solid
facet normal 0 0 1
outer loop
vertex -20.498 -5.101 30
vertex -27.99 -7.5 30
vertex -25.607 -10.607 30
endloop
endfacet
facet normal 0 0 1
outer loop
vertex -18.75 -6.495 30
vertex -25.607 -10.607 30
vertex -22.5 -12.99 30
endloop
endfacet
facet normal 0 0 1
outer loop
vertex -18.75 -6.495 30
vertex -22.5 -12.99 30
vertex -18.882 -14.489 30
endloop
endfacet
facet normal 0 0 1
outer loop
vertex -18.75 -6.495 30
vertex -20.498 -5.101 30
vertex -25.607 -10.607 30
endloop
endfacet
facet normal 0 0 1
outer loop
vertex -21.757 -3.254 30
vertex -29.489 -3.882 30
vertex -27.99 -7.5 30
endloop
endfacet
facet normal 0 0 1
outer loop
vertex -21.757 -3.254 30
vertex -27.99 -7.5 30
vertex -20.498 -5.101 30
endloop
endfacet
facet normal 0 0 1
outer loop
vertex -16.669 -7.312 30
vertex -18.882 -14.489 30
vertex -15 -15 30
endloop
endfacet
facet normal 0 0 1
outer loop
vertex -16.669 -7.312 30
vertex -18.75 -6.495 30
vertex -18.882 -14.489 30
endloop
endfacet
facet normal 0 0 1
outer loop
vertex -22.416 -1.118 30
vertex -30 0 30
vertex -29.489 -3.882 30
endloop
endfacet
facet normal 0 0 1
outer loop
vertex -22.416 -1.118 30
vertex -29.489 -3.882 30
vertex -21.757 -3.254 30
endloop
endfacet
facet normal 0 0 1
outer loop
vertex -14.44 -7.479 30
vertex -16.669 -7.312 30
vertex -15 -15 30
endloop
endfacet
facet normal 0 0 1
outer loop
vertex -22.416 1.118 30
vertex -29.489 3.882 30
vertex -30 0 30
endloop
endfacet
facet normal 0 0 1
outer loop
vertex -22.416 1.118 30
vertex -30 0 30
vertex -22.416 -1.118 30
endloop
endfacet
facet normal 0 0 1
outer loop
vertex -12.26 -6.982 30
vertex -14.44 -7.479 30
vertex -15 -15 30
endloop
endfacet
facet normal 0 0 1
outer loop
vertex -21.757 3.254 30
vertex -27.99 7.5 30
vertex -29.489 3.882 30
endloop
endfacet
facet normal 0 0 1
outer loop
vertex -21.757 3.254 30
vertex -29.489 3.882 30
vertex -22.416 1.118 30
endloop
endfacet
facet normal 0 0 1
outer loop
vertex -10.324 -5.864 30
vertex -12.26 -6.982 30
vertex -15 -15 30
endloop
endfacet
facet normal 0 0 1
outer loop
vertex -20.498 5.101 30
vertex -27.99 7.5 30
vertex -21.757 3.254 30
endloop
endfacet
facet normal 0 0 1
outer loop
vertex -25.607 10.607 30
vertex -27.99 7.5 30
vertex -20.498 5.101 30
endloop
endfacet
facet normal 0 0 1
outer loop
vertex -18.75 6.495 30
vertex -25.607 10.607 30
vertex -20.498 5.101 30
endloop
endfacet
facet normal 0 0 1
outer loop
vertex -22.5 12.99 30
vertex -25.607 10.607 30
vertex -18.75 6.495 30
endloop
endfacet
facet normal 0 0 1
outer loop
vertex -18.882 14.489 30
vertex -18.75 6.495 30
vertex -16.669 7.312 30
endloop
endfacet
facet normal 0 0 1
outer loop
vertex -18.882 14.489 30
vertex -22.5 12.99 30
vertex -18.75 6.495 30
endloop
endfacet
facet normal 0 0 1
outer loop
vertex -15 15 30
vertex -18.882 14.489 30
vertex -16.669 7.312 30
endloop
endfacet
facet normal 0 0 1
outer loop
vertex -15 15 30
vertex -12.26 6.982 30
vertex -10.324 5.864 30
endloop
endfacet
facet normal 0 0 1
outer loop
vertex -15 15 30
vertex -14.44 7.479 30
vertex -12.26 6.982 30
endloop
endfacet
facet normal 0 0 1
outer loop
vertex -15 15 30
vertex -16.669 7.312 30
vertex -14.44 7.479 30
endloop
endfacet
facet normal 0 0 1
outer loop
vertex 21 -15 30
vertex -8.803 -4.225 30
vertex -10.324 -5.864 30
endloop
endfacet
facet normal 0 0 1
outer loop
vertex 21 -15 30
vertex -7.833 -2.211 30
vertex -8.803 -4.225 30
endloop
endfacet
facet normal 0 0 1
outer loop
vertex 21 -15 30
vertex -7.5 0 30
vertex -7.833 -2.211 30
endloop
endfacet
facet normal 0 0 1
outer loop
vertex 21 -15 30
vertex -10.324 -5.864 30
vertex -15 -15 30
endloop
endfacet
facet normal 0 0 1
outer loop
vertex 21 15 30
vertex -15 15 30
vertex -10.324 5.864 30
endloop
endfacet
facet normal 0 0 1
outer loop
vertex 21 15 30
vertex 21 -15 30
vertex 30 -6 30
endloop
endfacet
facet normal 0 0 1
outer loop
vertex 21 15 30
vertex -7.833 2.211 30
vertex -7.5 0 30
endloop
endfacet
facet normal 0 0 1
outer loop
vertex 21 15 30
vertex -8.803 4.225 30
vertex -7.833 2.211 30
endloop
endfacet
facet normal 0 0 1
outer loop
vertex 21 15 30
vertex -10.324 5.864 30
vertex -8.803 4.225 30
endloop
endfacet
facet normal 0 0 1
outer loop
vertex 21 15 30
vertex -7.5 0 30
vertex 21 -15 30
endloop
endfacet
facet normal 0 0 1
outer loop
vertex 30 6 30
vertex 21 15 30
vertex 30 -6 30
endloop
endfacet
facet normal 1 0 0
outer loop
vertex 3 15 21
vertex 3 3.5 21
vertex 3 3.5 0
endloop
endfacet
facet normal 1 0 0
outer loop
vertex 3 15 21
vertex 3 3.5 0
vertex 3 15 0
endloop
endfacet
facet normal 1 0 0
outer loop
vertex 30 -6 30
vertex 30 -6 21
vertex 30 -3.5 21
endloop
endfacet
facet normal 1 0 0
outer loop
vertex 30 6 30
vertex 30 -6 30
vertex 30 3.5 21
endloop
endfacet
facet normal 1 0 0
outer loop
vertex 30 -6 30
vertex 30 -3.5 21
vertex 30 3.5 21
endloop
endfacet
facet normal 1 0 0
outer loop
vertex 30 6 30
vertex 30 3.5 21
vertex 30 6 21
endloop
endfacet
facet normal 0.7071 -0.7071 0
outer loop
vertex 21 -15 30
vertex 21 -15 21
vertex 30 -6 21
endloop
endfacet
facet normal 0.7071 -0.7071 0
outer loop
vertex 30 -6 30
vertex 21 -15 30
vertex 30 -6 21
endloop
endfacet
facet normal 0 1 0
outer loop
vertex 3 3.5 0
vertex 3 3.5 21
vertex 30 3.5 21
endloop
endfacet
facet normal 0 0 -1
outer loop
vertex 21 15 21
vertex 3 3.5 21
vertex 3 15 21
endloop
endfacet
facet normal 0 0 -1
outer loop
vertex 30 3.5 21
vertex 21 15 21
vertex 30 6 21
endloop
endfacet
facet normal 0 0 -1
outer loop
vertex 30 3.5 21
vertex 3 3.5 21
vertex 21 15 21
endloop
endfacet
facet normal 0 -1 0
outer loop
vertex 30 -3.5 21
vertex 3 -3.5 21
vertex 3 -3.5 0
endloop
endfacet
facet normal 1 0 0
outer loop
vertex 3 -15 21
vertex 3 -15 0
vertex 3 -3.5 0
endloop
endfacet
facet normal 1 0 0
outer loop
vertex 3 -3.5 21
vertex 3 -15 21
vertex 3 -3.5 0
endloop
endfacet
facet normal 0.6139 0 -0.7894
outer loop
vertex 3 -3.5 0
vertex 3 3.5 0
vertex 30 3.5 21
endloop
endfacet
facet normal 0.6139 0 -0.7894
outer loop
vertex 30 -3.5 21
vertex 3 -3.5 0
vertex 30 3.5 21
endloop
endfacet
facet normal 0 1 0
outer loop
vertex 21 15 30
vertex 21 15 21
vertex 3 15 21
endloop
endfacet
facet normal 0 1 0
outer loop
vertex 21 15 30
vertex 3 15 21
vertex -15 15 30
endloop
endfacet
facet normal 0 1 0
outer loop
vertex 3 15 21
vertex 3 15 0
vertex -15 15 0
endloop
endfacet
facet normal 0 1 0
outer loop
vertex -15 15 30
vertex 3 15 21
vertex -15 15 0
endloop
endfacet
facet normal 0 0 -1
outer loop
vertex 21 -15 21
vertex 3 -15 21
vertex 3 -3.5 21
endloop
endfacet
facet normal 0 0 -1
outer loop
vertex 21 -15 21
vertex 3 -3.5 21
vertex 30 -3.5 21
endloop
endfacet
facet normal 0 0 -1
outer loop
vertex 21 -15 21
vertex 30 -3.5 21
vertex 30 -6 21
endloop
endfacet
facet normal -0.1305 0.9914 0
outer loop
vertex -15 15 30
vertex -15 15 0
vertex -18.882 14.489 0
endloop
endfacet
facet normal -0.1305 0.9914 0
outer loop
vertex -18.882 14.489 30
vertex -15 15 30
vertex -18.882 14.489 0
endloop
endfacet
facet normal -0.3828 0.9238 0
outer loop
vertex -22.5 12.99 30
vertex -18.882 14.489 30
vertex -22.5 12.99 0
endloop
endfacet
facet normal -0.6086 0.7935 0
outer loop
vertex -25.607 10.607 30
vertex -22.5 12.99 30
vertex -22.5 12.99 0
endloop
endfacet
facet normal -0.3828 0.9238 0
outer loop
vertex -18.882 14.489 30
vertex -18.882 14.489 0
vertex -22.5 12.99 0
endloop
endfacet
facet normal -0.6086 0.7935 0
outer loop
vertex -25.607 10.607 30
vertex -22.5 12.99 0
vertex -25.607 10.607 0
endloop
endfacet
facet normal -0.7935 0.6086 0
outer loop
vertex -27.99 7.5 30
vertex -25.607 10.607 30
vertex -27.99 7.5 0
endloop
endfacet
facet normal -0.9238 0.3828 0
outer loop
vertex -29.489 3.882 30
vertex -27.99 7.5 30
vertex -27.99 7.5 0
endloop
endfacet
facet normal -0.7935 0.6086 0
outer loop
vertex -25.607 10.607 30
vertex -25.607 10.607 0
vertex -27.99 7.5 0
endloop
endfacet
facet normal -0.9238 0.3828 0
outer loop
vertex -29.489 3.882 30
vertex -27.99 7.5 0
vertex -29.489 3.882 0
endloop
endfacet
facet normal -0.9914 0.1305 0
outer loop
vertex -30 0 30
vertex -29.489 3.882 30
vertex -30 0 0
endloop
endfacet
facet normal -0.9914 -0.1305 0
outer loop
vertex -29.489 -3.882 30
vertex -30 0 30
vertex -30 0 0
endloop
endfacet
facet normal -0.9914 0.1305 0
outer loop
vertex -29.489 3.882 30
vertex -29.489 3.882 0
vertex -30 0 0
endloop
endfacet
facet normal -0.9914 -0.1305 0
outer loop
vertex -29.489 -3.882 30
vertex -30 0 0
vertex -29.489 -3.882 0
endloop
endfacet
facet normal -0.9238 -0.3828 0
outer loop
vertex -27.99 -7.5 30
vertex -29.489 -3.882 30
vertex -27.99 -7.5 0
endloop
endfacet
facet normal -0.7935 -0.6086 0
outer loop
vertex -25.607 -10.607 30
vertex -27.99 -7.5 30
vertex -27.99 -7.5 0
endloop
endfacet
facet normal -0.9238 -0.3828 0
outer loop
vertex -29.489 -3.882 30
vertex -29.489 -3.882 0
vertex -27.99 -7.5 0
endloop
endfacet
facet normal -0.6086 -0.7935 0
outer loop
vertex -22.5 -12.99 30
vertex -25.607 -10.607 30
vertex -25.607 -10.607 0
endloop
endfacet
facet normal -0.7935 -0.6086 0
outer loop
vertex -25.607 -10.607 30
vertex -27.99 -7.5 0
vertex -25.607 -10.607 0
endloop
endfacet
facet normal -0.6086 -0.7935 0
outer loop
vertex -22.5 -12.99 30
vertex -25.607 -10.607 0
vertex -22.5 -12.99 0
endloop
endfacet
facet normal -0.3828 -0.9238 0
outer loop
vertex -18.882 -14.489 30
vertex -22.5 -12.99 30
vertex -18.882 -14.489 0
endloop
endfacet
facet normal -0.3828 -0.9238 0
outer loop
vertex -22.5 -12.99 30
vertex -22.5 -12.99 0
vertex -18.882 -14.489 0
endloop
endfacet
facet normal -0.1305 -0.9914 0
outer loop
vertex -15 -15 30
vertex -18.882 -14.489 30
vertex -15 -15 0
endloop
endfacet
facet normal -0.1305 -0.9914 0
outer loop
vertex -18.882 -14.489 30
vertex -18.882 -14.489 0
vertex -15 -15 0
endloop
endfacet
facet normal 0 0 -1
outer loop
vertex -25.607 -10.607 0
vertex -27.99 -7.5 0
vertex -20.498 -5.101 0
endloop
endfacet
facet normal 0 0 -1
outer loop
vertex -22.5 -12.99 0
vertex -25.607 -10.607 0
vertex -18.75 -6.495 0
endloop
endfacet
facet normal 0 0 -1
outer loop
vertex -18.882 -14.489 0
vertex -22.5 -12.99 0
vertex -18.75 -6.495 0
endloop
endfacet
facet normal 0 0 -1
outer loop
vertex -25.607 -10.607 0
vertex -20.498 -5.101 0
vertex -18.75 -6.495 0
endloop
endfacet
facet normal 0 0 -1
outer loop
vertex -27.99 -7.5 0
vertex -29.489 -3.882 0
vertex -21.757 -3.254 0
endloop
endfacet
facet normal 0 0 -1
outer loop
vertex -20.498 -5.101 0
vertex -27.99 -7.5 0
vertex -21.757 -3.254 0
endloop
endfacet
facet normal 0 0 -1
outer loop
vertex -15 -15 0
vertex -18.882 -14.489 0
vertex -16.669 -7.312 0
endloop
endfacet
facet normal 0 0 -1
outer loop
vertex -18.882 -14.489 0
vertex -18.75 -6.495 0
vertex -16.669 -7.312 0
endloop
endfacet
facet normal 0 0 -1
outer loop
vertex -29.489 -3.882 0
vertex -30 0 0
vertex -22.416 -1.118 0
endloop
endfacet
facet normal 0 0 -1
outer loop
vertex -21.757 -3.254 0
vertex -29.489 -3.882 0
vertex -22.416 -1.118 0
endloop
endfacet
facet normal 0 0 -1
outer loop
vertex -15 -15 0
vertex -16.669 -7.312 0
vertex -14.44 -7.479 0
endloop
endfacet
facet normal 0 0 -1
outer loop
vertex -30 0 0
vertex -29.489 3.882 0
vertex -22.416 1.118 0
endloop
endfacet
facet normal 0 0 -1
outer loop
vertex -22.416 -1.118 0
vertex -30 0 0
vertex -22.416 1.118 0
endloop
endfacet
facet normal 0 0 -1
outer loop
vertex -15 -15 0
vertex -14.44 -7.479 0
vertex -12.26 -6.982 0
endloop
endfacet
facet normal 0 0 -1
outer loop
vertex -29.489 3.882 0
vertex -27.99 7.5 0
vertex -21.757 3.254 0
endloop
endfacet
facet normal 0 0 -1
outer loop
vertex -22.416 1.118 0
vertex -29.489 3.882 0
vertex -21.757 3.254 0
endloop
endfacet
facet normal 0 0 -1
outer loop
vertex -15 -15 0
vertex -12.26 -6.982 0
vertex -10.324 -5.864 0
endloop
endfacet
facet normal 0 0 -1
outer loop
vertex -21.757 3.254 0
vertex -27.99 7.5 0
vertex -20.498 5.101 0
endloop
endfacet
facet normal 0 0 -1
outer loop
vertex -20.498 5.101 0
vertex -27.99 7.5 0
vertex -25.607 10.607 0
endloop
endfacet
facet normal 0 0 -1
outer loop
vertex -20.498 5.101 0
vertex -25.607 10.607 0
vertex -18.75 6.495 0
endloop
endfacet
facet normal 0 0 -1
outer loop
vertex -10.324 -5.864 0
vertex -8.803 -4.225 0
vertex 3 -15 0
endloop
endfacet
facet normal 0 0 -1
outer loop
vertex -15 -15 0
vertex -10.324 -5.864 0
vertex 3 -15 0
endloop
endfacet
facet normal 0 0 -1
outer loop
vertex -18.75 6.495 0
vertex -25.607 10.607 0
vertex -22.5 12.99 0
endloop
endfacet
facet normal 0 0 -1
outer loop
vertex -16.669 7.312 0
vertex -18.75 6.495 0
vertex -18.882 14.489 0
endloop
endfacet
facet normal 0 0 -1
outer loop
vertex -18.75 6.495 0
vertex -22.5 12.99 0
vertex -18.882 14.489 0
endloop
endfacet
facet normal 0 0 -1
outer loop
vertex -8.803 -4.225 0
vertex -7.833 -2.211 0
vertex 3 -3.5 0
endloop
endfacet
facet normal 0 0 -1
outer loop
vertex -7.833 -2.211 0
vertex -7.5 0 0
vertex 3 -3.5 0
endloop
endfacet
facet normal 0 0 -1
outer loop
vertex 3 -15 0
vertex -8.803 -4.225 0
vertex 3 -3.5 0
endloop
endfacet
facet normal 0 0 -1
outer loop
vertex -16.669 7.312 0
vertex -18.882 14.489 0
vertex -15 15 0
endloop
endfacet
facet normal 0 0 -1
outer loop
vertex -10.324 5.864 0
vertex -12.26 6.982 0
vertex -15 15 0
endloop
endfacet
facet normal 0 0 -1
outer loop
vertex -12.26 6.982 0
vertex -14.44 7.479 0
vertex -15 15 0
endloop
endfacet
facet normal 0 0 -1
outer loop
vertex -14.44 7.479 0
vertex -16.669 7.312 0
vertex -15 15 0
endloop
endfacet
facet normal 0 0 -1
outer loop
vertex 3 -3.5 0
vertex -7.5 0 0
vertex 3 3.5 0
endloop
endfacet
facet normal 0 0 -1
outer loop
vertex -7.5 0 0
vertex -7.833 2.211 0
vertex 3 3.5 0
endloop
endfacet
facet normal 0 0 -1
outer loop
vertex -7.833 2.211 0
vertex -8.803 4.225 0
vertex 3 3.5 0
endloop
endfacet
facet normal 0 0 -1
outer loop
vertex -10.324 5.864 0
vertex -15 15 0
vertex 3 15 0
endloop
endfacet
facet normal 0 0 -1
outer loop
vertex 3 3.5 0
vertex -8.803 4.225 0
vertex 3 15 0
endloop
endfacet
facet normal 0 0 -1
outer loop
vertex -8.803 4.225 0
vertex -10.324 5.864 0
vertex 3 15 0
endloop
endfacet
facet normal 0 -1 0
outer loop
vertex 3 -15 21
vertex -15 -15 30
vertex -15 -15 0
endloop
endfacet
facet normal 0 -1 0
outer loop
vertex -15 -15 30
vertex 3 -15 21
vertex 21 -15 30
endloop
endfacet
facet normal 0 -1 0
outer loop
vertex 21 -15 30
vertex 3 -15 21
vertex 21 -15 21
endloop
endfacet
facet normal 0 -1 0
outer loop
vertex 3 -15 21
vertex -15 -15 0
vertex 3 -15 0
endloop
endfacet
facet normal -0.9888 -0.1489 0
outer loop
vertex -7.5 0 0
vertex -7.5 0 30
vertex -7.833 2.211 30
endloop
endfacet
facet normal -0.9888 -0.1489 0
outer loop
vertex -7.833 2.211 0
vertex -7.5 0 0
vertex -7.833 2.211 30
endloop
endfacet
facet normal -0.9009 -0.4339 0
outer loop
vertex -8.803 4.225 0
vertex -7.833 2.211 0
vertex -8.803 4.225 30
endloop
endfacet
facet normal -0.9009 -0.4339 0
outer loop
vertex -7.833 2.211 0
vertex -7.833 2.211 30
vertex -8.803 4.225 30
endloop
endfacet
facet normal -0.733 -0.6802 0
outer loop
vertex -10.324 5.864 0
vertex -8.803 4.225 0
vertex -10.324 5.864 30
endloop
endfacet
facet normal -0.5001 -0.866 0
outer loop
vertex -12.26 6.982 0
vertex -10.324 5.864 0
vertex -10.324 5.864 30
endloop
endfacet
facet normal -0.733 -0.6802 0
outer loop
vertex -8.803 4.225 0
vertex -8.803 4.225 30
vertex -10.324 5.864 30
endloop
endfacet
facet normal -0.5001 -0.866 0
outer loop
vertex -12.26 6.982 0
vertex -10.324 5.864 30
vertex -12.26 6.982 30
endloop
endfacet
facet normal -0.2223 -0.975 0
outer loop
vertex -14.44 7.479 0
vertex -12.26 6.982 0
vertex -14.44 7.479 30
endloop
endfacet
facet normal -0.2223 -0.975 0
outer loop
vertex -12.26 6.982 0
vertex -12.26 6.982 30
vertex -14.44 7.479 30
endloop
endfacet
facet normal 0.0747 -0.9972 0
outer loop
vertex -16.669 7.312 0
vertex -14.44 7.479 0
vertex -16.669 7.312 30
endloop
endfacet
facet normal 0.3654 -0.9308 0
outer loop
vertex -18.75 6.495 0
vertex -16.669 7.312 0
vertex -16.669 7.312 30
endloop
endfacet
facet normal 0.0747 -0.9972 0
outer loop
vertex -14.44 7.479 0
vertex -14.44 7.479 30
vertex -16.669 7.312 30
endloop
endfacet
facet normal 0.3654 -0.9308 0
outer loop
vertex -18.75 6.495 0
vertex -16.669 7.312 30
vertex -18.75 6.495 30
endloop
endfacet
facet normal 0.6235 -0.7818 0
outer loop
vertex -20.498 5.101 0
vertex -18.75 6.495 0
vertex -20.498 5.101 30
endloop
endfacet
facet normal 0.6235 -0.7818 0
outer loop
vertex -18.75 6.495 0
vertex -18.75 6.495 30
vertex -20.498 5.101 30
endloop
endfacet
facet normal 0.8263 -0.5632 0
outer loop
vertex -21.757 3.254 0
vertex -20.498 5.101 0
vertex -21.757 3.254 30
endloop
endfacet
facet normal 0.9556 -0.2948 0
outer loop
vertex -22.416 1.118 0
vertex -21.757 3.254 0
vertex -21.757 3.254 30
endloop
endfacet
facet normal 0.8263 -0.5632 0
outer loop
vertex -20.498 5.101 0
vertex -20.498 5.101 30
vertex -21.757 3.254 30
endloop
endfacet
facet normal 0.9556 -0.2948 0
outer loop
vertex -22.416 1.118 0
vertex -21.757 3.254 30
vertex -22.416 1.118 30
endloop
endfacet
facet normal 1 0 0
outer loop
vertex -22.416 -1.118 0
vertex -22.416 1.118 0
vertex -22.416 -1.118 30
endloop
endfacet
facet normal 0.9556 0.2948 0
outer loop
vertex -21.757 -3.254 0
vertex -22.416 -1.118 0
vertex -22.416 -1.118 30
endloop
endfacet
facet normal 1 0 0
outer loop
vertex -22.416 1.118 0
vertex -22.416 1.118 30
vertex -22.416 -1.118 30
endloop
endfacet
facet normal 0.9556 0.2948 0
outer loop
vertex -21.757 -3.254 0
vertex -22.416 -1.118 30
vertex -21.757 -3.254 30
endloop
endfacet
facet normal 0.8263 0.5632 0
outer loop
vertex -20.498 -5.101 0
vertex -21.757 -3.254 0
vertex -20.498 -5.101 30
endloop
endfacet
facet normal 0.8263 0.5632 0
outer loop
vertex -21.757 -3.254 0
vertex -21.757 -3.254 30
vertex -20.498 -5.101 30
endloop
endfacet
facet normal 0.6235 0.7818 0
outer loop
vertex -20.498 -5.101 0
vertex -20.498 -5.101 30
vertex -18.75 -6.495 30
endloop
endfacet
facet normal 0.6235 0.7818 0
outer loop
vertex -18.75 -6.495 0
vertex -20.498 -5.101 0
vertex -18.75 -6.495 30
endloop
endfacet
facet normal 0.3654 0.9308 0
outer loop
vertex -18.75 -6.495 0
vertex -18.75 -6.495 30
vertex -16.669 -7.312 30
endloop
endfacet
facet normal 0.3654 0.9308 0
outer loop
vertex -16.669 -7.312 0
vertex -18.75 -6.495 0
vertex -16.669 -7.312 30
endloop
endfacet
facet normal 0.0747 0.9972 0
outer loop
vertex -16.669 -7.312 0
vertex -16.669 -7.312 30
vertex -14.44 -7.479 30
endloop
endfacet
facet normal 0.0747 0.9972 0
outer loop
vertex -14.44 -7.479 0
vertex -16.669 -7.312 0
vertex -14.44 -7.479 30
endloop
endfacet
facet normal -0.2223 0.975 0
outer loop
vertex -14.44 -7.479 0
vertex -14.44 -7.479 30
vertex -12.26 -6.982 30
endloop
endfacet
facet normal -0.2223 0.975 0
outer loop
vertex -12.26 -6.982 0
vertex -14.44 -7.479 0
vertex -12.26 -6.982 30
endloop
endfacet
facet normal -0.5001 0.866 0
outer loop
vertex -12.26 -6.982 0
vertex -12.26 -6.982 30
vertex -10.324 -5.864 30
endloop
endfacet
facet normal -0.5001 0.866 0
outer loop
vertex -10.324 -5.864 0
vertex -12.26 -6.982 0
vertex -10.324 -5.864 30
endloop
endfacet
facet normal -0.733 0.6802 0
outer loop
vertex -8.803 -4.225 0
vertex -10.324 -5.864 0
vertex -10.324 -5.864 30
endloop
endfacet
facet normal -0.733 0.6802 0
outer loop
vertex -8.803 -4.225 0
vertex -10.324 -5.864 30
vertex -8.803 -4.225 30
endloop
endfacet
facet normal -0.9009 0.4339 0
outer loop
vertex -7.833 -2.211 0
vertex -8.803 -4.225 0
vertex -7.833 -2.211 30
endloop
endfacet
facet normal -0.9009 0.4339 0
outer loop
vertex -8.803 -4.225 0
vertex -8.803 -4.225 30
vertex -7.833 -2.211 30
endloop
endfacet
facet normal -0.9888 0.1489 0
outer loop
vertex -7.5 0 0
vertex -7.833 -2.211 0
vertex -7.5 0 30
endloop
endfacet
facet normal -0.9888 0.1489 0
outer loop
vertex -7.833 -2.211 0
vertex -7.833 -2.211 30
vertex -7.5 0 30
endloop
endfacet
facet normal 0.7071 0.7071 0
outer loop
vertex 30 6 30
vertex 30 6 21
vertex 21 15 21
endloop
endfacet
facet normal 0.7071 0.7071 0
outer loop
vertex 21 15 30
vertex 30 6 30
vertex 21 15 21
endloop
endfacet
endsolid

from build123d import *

# Parameters (mm, degrees)
F1_DEPTH = 30
F2_R     = 7.5
F3_DEPTH = 30
F5_DEPTH = 21
F6_W     = 27
F6_H     = 7
F7_DEPTH = 21
F9_DEPTH = 25


with BuildPart() as f1:
    # F0 (on Top) → F1 (new body)
    with BuildSketch(Plane.XY):
        with BuildLine():
            Line((21, 15), (-15, 15))
            ThreePointArc((-15, 15), (-30, 0), (-15, -15))
            Line((-15, -15), (21, -15))
            Line((21, -15), (30, -6))
            Line((30, -6), (30, 6))
            Line((30, 6), (21, 15))
        make_face()
    extrude(amount=F1_DEPTH)

    # F2 (on face) → F3 (cut)
    with BuildSketch(Plane.XY.offset(30)):
        with Locations((-15, 0)):
            Circle(F2_R)
    extrude(amount=-F3_DEPTH, mode=Mode.SUBTRACT)

    # F4 (on face) → F5 (cut)
    with BuildSketch(Plane(origin=(0, 0, 0), x_dir=(1, 0, 0), z_dir=(0, 0, -1))):
        Polygon((21, 15), (3, 15), (3, -15), (21, -15), (30, -6), (30, 6), align=None)
    extrude(amount=-F5_DEPTH, mode=Mode.SUBTRACT)

    # F6 (on face) → F7 (join)
    with BuildSketch(Plane(origin=(0, 0, 21), x_dir=(1, 0, 0), z_dir=(0, 0, -1))):
        with Locations((16.5, 0)):
            Rectangle(F6_W, F6_H)
    extrude(amount=F7_DEPTH)

    # F8 (on face) → F9 (cut)
    with BuildSketch(Plane(origin=(0, 3.5, 0), x_dir=(-1, 0, 0), z_dir=(0, 1, 0))):
        Polygon((-30, 0), (-3, 0), (-30, 21), align=None)
    extrude(amount=-F9_DEPTH, mode=Mode.SUBTRACT)


solid = f1.part
